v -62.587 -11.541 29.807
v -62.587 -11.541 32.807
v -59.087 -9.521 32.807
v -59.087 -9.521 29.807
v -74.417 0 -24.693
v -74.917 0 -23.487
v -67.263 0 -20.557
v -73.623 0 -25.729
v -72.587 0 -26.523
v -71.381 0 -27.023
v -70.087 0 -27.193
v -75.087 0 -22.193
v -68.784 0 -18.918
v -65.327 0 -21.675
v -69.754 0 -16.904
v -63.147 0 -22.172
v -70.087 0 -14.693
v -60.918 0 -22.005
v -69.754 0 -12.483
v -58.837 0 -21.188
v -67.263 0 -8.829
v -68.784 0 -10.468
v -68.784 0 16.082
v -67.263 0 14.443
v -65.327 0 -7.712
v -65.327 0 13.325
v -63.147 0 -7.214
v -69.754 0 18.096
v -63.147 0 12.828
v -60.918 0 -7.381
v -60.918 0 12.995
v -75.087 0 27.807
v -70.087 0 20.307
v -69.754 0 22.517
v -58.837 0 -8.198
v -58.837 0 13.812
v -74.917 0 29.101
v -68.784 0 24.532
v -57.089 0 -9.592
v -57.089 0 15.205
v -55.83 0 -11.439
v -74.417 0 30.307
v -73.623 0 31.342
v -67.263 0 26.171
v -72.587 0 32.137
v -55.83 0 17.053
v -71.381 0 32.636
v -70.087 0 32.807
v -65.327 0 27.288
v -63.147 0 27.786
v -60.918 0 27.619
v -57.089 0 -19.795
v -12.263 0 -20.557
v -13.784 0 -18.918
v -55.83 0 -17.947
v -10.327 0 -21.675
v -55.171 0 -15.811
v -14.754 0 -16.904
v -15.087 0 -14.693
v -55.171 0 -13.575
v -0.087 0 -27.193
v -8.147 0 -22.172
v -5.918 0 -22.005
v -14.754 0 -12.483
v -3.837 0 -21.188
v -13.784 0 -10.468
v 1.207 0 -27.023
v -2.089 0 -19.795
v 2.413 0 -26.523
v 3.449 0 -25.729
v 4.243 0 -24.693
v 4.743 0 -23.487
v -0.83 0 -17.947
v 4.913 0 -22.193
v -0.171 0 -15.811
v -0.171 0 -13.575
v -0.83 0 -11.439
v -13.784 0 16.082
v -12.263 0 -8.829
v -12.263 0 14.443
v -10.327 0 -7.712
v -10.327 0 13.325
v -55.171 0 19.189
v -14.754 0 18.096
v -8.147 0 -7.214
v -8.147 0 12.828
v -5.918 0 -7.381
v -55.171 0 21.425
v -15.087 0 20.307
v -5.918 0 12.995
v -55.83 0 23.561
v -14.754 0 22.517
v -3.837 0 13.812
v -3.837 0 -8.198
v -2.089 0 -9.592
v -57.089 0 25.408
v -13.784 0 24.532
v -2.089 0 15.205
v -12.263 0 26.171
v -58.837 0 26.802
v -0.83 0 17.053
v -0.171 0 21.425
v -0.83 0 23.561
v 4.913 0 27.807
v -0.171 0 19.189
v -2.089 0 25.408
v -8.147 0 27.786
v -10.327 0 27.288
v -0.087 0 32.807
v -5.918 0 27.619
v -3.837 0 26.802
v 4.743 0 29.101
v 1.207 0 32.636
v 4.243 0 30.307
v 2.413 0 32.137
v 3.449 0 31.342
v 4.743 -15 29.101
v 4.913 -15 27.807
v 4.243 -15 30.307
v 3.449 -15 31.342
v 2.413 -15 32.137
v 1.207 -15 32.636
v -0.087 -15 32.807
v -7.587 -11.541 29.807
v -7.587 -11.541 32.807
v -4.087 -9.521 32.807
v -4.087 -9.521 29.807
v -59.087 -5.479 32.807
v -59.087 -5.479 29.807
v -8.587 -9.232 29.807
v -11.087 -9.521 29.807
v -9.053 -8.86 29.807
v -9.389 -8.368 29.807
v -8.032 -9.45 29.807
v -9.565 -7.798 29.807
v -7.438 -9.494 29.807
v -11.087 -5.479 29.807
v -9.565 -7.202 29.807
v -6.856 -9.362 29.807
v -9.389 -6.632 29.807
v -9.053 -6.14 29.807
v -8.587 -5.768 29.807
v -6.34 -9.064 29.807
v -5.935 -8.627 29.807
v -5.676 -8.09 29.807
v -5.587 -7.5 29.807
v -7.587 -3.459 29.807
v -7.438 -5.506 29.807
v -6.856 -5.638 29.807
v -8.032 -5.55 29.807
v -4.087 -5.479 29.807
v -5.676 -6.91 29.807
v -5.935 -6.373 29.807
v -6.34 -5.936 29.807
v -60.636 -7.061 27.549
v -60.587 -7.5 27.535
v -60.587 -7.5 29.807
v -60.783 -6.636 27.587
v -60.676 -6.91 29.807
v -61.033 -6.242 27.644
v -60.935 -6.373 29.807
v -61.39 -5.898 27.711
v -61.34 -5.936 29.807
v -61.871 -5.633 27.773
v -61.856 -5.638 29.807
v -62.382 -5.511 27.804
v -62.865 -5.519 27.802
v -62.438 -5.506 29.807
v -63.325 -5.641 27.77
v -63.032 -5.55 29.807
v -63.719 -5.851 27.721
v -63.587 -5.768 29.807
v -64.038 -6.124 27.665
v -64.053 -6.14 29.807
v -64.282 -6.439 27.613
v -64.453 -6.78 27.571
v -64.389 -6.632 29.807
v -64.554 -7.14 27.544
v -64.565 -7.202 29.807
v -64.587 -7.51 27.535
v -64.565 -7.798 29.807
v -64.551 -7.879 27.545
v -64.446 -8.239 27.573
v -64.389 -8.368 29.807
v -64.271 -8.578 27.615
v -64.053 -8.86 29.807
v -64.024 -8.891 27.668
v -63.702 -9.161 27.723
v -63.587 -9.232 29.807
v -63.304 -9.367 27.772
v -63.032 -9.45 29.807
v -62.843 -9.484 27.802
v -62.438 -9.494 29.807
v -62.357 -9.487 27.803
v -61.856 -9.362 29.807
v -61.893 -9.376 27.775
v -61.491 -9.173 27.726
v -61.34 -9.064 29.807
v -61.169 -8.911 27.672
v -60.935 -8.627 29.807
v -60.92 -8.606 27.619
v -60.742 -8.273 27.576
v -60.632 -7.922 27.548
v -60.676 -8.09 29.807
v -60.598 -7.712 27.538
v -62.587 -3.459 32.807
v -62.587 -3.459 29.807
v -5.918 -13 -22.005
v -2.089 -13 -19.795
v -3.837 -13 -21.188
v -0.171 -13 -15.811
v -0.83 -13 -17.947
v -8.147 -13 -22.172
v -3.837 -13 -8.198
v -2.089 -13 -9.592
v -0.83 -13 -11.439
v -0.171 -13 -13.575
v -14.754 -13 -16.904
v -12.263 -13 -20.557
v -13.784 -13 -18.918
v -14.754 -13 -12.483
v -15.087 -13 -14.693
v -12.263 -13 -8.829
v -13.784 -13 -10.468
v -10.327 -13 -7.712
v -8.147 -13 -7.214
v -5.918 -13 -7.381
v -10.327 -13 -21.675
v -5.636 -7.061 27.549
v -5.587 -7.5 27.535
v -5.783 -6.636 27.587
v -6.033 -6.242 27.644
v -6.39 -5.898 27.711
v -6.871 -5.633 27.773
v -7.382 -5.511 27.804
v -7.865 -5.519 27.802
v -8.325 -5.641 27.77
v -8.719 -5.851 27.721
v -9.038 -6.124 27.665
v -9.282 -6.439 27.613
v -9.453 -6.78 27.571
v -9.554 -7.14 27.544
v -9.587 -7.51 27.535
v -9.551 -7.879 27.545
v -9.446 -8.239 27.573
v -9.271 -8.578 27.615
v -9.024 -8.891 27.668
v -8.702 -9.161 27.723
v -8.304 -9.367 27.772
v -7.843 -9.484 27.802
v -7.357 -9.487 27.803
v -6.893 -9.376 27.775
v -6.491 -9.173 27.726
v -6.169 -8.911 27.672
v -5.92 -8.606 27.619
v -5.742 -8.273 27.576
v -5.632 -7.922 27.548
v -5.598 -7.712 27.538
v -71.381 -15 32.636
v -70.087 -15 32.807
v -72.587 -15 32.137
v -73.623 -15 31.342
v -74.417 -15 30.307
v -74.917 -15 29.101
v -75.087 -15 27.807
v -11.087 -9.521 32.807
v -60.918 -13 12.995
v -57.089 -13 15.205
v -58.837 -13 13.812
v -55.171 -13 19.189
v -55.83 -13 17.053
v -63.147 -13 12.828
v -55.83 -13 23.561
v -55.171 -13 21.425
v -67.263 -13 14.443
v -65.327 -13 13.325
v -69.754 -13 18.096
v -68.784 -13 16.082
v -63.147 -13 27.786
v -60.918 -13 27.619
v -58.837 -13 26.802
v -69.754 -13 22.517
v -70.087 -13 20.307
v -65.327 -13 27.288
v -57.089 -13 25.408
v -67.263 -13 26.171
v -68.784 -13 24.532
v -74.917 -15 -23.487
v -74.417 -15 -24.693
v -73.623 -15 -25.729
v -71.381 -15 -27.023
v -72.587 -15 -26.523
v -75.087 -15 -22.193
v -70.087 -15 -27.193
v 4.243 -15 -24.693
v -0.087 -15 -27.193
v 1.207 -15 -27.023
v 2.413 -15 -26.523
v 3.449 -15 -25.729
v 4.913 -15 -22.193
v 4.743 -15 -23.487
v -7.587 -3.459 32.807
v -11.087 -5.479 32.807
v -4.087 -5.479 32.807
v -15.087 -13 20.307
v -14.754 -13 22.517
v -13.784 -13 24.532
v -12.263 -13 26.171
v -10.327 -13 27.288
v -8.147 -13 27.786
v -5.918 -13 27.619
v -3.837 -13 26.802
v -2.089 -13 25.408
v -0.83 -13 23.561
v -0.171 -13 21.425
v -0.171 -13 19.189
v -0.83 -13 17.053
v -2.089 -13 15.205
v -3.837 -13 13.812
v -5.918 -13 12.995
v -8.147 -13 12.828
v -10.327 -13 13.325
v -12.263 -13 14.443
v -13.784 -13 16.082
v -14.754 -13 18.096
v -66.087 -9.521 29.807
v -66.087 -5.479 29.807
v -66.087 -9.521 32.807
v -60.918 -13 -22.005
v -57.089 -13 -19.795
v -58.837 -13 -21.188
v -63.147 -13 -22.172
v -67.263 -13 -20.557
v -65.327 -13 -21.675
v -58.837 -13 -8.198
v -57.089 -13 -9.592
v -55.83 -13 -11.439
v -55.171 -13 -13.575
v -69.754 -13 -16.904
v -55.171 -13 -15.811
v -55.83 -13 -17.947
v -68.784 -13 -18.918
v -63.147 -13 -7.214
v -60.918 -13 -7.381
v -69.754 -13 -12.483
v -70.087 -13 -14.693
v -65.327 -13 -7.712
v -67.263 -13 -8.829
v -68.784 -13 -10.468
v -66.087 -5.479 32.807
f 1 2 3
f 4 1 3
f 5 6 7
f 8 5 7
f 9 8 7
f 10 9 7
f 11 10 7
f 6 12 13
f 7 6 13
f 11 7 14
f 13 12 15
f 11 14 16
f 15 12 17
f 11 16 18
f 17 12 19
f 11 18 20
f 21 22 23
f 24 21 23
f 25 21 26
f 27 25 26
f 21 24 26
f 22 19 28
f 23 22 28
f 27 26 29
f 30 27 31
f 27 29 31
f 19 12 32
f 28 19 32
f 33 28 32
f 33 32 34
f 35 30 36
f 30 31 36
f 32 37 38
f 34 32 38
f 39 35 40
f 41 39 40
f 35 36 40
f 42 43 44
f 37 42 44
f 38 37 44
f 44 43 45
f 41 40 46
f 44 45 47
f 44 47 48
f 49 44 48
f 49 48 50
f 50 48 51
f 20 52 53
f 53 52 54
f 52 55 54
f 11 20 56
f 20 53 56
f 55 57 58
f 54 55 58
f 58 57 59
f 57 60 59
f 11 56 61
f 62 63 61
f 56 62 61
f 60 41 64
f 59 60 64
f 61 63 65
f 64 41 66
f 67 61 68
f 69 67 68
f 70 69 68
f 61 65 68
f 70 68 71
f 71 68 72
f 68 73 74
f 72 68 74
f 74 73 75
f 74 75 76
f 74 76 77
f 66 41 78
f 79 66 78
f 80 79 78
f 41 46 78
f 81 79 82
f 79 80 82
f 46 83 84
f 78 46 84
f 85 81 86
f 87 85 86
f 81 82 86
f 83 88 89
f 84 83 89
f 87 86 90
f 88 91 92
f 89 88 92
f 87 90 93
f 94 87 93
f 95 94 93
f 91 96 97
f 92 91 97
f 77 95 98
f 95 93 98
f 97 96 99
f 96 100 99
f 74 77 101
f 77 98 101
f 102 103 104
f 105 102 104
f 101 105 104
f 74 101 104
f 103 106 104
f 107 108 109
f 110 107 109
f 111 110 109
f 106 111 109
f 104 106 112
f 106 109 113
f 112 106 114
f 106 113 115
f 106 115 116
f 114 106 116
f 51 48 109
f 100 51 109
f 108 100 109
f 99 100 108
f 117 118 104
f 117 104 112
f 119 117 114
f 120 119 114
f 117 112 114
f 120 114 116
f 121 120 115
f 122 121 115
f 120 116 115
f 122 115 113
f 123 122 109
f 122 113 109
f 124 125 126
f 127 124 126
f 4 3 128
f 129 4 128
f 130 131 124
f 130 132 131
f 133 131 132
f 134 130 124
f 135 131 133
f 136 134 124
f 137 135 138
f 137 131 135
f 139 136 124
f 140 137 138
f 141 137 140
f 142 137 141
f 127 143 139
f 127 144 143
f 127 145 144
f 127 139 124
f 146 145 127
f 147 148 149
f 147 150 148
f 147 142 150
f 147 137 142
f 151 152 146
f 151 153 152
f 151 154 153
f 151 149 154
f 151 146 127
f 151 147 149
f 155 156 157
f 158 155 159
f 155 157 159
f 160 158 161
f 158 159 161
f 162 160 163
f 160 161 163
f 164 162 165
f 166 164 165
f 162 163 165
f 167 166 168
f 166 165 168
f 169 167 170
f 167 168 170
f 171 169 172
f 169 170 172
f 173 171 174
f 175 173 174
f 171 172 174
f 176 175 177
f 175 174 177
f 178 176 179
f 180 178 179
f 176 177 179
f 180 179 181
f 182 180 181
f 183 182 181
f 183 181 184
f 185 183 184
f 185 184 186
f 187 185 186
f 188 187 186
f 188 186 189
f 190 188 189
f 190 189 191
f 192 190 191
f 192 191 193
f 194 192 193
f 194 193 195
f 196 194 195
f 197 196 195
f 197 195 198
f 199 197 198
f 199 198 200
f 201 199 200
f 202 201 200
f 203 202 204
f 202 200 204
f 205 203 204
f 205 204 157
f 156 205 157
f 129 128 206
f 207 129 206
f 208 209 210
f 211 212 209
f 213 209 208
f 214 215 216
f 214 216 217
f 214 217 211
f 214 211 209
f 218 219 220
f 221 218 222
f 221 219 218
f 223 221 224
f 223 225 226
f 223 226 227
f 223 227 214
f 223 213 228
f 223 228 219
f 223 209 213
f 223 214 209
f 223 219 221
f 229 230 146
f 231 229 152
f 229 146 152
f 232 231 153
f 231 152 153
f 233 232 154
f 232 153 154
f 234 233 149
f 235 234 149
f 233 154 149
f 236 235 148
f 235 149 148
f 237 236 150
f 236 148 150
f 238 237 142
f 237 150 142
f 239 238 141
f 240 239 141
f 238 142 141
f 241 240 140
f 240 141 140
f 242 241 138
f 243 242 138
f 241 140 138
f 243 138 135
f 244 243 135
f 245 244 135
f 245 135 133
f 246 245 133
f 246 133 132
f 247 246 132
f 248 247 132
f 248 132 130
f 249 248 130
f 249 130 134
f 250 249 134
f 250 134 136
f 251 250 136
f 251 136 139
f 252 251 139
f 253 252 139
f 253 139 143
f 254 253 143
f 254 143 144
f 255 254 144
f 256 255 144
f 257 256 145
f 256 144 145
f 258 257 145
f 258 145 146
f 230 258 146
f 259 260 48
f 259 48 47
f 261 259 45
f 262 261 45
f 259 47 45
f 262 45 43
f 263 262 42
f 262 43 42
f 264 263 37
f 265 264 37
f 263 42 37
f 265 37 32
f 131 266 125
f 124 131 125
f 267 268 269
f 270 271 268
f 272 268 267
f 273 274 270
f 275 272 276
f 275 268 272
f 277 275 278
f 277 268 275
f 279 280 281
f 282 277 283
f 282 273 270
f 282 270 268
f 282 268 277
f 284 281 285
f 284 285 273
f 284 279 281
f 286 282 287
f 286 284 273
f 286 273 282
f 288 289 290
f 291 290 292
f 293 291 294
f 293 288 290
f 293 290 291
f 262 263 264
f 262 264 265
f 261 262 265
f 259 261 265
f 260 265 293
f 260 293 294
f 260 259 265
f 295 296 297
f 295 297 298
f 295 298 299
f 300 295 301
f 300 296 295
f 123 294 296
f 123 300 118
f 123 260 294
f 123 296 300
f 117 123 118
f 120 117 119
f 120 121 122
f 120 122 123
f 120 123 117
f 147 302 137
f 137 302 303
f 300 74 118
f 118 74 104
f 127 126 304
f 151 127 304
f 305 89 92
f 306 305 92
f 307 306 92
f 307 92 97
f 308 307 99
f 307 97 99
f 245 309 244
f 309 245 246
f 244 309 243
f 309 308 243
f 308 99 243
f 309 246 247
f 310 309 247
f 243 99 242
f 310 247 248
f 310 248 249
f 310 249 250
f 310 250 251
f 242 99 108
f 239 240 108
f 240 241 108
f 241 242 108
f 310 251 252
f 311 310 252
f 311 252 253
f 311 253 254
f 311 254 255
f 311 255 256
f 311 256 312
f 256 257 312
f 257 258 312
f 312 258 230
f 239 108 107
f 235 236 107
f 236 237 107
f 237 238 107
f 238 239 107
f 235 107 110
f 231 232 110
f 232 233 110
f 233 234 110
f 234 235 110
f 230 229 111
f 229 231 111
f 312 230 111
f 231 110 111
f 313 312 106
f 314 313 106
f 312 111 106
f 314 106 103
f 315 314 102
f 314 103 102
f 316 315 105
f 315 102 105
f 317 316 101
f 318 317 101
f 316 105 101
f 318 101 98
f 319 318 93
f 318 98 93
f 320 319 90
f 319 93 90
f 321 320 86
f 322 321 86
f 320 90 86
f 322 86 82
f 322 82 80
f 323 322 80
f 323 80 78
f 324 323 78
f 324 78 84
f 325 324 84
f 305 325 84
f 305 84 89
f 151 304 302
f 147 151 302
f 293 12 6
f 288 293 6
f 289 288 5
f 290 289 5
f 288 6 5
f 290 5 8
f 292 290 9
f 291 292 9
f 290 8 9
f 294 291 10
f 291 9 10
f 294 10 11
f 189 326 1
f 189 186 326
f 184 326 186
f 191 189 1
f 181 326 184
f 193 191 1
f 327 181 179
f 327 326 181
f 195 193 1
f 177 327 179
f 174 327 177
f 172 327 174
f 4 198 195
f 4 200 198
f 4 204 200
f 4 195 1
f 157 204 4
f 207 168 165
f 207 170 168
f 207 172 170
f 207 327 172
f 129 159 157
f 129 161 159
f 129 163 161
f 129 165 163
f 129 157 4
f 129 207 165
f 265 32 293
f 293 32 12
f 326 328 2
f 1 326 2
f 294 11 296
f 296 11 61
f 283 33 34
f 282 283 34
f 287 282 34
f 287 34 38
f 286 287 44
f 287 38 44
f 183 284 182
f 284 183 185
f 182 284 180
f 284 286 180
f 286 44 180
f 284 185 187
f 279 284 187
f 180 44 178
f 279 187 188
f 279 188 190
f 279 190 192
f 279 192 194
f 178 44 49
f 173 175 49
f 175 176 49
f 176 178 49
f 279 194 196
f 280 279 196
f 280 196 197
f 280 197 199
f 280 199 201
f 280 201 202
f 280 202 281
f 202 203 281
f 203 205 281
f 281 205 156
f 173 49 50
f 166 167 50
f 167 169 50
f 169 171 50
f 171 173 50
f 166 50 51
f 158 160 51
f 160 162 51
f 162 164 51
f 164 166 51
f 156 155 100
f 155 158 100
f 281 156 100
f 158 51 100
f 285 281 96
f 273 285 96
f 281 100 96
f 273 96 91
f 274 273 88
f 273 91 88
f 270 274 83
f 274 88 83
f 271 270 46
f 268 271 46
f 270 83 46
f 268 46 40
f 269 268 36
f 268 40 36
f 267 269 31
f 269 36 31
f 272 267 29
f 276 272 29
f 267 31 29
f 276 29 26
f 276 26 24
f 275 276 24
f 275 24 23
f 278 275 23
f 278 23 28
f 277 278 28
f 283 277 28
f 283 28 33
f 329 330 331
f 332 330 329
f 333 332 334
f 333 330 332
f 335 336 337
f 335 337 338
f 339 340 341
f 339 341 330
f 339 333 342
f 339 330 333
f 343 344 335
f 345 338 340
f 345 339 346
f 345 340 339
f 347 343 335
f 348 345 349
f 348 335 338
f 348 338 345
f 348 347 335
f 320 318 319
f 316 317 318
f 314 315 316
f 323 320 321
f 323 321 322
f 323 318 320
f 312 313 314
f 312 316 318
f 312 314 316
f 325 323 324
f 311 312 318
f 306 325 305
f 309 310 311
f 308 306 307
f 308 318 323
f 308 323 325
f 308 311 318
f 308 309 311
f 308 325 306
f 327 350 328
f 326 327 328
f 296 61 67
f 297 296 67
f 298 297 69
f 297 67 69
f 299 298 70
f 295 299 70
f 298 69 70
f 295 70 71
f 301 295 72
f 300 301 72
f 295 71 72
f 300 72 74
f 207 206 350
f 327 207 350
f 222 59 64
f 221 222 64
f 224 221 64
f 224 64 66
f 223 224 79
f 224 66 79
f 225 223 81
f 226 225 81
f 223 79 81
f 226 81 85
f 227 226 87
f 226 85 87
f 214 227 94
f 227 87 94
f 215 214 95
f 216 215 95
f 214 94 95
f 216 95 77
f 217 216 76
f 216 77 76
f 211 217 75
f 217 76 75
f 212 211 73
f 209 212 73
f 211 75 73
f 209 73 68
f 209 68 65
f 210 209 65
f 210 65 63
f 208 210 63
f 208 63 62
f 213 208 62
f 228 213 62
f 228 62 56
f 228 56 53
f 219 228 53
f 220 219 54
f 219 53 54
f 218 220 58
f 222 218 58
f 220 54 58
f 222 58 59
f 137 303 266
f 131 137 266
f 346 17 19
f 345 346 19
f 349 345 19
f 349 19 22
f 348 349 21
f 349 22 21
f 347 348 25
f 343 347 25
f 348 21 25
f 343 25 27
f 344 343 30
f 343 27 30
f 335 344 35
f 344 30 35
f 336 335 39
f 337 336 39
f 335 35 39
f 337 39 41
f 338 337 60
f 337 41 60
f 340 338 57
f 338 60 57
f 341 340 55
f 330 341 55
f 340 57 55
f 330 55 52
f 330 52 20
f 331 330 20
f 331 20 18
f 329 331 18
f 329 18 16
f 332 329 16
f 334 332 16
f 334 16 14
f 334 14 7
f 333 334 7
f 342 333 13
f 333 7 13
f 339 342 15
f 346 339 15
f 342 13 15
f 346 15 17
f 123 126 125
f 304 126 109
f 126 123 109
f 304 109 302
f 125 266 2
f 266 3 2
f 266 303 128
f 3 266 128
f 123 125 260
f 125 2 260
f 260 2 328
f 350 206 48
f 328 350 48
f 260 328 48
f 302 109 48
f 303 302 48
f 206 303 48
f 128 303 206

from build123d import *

# Parameters (mm, degrees)
F1_DEPTH = 15
F2_R     = 7.5
F3_DEPTH = 13
F4_R     = 2
F5_DEPTH = 6
F7_DEPTH = 3


with BuildPart() as f1:
    # F0 (on Front) → F1 (new body)
    with BuildSketch(Plane.XZ):
        with BuildLine():
            Line((-0.08701, 32.806785), (-70.08701, 32.806785))
            ThreePointArc((-70.08701, 32.806785), (-73.622544, 31.342318), (-75.08701, 27.806785))
            Line((-75.08701, 27.806785), (-75.08701, -22.193215))
            ThreePointArc((-75.08701, -22.193215), (-73.622544, -25.728749), (-70.08701, -27.193215))
            Line((-70.08701, -27.193215), (-0.08701, -27.193215))
            ThreePointArc((-0.08701, -27.193215), (3.448524, -25.728749), (4.91299, -22.193215))
            Line((4.91299, -22.193215), (4.91299, 27.806785))
            ThreePointArc((4.91299, 27.806785), (3.448524, 31.342318), (-0.08701, 32.806785))
        make_face()
    extrude(amount=F1_DEPTH)

    # F2 (on face) → F3 (cut)
    with BuildSketch(Plane(origin=(0, 0, 0), x_dir=(-1, 0, 0), z_dir=(0, 1, 0))):
        with Locations((7.58701, 20.306785)):
            Circle(F2_R)
        with Locations((62.58701, 20.306785)):
            Circle(F2_R)
        with Locations((62.58701, -14.693215)):
            Circle(F2_R)
        with Locations((7.58701, -14.693215)):
            Circle(F2_R)
    extrude(amount=-F3_DEPTH, mode=Mode.SUBTRACT)

    # F4 (on face) → F5 (cut)
    with BuildSketch(Plane.XY.offset(32.806785)):
        with Locations((-62.58701, -7.5)):
            Circle(F4_R)
        with Locations((-7.58701, -7.5)):
            Circle(F4_R)
    extrude(amount=-F5_DEPTH, mode=Mode.SUBTRACT)

    # F6 (on face) → F7 (cut)
    with BuildSketch(Plane.XY.offset(32.806785)):
        Polygon((-59.08701, -9.520726), (-59.08701, -5.479274), (-62.58701, -3.458548), (-66.08701, -5.479274), (-66.08701, -9.520726), (-62.58701, -11.541452), align=None)
        Polygon((-4.08701, -9.520726), (-4.08701, -5.479274), (-7.58701, -3.458548), (-11.08701, -5.479274), (-11.08701, -9.520726), (-7.58701, -11.541452), align=None)
    extrude(amount=-F7_DEPTH, mode=Mode.SUBTRACT)


solid = f1.part
